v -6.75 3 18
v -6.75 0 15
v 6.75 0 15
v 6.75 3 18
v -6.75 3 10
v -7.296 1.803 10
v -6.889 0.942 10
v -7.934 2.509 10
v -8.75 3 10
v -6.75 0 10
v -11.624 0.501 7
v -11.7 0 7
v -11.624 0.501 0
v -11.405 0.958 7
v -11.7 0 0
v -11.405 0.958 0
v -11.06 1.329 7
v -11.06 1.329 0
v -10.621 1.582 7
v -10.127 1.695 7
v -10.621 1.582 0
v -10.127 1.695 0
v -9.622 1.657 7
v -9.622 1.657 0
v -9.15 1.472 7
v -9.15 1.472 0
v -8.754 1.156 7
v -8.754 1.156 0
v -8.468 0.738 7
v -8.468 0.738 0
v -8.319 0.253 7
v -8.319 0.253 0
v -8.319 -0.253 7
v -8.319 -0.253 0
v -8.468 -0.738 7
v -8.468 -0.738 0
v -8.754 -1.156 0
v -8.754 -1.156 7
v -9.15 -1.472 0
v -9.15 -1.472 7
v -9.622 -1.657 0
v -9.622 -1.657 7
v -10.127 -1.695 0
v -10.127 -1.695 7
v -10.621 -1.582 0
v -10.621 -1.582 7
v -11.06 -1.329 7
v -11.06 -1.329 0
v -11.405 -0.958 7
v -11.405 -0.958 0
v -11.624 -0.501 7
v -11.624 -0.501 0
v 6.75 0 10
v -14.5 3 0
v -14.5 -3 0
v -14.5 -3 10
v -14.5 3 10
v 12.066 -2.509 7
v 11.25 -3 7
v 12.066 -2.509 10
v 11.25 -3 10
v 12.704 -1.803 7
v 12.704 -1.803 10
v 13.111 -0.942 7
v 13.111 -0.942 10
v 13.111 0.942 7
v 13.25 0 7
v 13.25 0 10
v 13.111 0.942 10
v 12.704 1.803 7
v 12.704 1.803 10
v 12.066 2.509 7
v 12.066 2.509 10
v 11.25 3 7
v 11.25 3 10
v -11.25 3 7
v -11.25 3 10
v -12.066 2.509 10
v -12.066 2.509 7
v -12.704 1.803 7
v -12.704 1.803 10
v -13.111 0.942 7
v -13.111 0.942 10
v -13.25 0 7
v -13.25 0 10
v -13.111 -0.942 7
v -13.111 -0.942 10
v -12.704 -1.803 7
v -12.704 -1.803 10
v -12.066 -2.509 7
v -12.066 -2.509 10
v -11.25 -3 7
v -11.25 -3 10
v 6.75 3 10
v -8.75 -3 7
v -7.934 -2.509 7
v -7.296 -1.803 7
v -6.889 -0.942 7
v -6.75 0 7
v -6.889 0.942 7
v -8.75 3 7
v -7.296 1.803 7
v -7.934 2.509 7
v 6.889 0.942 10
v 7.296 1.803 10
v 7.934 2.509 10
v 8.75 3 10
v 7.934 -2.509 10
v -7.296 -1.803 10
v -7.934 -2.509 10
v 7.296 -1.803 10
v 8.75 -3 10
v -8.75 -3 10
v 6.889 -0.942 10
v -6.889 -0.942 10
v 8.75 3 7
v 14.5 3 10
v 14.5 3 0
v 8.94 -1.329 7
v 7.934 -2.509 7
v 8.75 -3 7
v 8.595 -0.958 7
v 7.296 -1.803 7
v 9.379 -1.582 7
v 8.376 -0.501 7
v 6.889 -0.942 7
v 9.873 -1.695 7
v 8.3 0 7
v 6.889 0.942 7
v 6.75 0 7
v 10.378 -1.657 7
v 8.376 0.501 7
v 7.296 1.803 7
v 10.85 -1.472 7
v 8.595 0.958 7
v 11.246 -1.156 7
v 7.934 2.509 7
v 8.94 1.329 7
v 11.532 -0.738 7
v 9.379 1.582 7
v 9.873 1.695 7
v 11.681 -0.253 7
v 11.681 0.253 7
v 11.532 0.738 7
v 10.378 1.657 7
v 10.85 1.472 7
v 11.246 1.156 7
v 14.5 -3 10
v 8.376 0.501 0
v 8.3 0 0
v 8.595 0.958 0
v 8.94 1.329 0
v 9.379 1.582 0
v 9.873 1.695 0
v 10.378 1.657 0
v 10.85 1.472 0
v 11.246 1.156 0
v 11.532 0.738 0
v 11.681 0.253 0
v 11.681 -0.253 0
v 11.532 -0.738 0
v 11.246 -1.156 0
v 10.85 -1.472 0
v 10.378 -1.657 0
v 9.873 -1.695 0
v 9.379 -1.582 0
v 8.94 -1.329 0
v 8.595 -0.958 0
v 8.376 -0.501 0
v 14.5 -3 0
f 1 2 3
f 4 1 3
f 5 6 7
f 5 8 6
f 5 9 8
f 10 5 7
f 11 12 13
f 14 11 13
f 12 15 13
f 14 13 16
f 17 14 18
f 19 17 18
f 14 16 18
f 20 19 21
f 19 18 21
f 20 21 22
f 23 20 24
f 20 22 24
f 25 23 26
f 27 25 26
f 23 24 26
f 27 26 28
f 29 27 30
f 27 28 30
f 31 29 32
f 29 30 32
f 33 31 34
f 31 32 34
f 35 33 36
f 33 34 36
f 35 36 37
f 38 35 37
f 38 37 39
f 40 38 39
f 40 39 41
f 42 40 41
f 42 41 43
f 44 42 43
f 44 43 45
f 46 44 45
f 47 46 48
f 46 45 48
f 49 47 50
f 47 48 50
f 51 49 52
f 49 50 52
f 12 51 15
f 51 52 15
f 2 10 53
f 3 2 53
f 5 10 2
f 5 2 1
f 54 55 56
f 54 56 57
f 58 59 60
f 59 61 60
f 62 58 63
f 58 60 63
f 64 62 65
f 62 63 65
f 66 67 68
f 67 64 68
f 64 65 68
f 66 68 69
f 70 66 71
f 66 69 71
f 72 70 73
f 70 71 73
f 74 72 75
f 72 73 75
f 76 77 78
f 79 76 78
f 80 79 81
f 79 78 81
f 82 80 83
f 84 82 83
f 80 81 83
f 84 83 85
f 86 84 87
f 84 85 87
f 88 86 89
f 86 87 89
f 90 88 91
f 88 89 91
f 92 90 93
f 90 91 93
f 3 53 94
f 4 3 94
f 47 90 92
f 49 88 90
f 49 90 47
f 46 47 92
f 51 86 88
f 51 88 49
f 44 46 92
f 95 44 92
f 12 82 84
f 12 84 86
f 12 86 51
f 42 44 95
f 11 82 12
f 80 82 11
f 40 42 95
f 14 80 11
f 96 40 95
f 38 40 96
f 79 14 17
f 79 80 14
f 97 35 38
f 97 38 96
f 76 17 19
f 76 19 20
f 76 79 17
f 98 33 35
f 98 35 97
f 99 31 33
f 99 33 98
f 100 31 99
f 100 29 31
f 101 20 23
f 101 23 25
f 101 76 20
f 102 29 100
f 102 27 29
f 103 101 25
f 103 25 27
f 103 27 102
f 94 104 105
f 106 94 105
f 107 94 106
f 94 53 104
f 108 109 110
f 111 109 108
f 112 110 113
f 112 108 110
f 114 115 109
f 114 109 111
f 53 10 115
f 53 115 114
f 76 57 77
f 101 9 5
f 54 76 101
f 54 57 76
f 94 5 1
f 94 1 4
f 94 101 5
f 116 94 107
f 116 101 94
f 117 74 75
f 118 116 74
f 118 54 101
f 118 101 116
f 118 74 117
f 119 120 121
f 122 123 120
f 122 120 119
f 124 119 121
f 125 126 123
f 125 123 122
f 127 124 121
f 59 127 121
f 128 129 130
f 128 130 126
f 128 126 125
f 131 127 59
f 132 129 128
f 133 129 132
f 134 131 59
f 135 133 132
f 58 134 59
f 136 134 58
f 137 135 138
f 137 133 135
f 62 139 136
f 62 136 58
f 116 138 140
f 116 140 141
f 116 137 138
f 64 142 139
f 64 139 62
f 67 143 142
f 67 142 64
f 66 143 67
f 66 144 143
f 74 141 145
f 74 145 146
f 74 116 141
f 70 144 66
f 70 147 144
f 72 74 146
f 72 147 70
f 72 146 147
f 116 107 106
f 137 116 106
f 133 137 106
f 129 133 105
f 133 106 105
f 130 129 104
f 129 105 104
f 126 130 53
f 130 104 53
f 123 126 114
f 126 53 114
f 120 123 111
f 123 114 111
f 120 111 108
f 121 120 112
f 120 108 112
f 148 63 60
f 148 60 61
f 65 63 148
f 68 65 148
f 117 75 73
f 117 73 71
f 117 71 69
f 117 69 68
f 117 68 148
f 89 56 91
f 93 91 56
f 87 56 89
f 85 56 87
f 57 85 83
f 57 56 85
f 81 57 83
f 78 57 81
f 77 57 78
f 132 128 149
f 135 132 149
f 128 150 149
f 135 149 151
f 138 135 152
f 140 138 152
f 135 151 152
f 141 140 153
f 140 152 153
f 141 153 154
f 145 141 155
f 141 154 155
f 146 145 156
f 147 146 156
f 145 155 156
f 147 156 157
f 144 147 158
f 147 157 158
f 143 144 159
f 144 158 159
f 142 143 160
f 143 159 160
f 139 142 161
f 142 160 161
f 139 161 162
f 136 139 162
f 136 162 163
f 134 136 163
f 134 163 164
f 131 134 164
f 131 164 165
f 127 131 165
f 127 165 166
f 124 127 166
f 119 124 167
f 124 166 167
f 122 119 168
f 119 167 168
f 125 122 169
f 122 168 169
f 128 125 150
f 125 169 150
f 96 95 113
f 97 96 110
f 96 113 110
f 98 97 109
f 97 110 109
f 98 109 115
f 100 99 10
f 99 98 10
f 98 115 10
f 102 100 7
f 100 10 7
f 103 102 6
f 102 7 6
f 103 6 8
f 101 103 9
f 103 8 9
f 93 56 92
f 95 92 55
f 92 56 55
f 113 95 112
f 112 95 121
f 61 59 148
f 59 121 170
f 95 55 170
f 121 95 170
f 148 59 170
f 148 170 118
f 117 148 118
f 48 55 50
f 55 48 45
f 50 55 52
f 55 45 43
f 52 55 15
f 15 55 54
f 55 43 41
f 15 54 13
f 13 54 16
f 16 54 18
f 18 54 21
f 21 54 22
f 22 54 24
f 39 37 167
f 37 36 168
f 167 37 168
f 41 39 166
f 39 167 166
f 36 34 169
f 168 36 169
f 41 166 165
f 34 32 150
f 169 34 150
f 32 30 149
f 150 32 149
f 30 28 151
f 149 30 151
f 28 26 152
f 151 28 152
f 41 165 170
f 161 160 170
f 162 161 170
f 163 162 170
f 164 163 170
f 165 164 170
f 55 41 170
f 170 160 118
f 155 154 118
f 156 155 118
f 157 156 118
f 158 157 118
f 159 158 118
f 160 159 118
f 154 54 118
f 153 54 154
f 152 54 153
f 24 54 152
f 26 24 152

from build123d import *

# Parameters (mm, degrees)
SKETCH1_W                      = 29
SKETCH1_H                      = 6
BOSS_EXTRUDE1_DEPTH            = 10
SKETCH5_W                      = 13.5
SKETCH5_H                      = 3
BOSS_EXTRUDE2_DEPTH            = 8
CBORE_FOR_M3_SHCS1_D           = 3.4
CBORE_FOR_M3_SHCS1_CBORE_D     = 6.5
CBORE_FOR_M3_SHCS1_CBORE_DEPTH = 3
CHAMFER1_SIZE                  = 3


with BuildPart() as part:
    # Sketch1 → Boss-Extrude1 (new body)
    with BuildSketch(Plane.XY):
        Rectangle(SKETCH1_W, SKETCH1_H)
    extrude(amount=BOSS_EXTRUDE1_DEPTH)

    # Sketch5 → Boss-Extrude2 (add)
    with BuildSketch(Plane.XY.offset(10)):
        with Locations((0, 1.5)):
            Rectangle(SKETCH5_W, SKETCH5_H)
    extrude(amount=BOSS_EXTRUDE2_DEPTH)

    # CBORE for M3 SHCS1 (through all)
    with Locations(Plane.XY.offset(10)):
        with Locations((-10, 0), (10, 0)):
            CounterBoreHole(CBORE_FOR_M3_SHCS1_D / 2, CBORE_FOR_M3_SHCS1_CBORE_D / 2, CBORE_FOR_M3_SHCS1_CBORE_DEPTH)

    # Chamfer1
    chamfer1_edges = [part.edges().sort_by_distance(p)[0] for p in [
        (0, 0, 18),
    ]]
    chamfer(chamfer1_edges, length=CHAMFER1_SIZE - 0.0001)  # a hair under: the kernel refuses the full size


solid = part.part
